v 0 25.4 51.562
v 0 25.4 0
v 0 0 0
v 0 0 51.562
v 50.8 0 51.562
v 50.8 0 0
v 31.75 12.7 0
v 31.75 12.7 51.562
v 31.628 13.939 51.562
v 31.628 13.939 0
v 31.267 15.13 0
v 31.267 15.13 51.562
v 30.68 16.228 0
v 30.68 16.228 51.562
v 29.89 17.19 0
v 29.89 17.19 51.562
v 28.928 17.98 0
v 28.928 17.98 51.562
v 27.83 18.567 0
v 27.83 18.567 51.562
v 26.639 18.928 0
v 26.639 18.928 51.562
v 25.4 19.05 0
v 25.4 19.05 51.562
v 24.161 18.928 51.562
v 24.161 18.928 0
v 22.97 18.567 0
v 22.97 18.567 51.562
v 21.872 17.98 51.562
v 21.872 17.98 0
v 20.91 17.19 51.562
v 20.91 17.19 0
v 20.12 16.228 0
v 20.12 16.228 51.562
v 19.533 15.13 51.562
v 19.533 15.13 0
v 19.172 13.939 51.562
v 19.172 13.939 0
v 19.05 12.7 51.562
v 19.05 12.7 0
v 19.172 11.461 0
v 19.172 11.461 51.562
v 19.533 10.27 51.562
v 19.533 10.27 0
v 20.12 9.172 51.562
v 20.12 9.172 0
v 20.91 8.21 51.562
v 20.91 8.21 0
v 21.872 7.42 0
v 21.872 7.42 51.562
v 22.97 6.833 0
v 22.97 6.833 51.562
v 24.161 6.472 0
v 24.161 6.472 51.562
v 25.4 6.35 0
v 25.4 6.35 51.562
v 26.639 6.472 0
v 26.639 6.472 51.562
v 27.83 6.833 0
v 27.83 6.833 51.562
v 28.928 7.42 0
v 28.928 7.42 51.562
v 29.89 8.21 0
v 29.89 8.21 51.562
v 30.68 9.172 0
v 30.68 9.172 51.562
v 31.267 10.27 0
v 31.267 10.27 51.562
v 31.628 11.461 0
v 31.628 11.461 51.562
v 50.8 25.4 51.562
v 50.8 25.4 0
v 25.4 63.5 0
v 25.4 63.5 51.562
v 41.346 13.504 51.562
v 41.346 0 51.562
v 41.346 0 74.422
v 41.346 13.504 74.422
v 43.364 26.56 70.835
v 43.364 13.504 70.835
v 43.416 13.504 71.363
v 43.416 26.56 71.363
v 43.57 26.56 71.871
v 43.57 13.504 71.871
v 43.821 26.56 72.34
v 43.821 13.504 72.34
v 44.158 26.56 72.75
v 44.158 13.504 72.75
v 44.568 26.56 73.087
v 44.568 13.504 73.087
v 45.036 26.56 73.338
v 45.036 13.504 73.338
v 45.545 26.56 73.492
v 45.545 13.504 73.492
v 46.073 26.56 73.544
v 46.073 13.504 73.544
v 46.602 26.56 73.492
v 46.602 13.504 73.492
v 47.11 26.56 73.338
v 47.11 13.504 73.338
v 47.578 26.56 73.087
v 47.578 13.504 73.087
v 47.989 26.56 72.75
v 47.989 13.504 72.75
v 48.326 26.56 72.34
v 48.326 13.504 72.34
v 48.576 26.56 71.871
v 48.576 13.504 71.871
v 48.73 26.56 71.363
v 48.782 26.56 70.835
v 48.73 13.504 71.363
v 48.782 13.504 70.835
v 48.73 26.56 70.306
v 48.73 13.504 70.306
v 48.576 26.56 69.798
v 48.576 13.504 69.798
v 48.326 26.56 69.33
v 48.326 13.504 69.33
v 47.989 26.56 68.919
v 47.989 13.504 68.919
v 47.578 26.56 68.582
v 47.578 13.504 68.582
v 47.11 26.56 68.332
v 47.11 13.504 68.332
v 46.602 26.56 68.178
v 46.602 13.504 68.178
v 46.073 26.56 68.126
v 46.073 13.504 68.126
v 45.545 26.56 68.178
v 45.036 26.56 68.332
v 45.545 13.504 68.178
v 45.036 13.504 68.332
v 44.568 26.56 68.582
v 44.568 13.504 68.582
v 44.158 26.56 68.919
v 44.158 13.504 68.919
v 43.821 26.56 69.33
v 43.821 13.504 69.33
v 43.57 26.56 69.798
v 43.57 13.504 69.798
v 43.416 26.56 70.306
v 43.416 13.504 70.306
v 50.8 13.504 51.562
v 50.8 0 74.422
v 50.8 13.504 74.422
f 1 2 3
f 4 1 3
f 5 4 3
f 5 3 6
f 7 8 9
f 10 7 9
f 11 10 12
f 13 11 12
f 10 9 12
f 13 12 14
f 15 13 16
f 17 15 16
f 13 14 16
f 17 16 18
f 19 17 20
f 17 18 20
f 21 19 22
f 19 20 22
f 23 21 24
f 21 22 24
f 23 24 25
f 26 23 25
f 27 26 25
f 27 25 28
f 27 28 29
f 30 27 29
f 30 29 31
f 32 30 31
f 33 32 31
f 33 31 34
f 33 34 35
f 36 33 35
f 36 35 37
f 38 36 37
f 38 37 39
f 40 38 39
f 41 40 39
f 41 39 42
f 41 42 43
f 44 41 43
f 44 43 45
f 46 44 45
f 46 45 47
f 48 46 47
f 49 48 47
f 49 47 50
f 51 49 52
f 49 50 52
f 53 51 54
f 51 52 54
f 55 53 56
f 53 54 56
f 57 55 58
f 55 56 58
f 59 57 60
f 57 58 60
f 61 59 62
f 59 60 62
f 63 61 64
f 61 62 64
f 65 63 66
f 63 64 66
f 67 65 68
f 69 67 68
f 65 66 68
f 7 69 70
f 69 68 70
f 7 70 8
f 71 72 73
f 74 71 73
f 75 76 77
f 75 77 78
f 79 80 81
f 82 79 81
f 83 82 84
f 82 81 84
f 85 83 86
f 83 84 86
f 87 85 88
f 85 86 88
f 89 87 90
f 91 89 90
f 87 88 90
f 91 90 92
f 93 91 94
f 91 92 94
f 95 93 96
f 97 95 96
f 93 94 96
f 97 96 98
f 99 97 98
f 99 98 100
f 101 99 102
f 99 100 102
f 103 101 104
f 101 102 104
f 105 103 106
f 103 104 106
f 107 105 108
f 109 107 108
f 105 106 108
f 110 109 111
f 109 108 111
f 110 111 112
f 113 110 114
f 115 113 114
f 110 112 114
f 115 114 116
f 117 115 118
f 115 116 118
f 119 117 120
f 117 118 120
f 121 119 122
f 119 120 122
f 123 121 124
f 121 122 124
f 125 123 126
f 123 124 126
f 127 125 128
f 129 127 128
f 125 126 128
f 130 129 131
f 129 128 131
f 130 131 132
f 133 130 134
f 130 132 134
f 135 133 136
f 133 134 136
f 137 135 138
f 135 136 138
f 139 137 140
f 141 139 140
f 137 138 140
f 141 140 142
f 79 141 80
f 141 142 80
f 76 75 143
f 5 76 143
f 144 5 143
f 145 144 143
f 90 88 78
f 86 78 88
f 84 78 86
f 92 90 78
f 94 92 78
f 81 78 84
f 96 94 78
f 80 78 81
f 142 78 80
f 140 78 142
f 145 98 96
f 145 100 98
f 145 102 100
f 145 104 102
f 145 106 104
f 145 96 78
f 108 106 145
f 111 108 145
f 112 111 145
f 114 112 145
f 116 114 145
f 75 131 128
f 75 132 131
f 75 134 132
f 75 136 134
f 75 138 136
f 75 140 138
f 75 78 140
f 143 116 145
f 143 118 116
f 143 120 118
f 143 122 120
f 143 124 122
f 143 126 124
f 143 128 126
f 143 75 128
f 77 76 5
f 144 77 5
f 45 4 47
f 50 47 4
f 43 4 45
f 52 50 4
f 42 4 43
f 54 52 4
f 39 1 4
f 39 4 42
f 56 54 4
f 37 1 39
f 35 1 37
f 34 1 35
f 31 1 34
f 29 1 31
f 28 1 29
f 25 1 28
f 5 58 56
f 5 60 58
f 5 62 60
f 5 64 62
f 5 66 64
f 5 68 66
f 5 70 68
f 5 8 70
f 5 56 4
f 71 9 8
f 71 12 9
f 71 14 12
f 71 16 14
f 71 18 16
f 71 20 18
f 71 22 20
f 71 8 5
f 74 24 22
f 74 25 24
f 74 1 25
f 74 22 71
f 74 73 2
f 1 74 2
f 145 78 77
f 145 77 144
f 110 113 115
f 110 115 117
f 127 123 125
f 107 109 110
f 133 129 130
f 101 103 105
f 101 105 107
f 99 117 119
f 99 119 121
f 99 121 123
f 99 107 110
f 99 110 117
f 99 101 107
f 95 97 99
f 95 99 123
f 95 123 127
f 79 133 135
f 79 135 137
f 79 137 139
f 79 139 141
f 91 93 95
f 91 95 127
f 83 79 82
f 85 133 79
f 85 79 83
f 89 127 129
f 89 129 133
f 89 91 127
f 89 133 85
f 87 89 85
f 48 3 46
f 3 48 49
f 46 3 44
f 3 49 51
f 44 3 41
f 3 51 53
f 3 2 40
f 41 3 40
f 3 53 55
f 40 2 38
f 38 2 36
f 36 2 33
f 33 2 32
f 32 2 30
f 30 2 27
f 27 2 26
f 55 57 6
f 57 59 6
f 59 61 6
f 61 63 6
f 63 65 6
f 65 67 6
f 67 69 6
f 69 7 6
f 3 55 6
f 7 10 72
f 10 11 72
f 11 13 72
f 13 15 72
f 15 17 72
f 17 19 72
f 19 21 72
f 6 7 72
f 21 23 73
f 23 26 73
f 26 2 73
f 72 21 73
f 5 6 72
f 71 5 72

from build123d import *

# Parameters (mm, degrees)
F1_DEPTH = 51.562
F2_R     = 6.35
F3_DEPTH = 51.563
F4_W     = 9.453815
F4_H     = 13.504244
F5_DEPTH = 22.86
F6_R     = 2.708969
F7_DEPTH = 13.0556


with BuildPart() as f1:
    # F0 (on Top) → F1 (new body)
    with BuildSketch(Plane.XY):
        Polygon((0, 25.4), (0, 0), (50.8, 0), (50.8, 25.4), (25.4, 25.4), align=None)
        Polygon((25.4, 63.5), (0, 25.4), (25.4, 25.4), align=None)
        Polygon((25.4, 25.4), (50.8, 25.4), (25.4, 63.5), align=None)
    extrude(amount=F1_DEPTH)

    # F2 (on face) → F3 (cut, through all)
    with BuildSketch(Plane.XY.offset(51.562)):
        with Locations((25.4, 12.7)):
            Circle(F2_R)
    extrude(amount=-F3_DEPTH, mode=Mode.SUBTRACT)


with BuildPart() as f5:
    # F4 (on face) → F5 (new body)
    with BuildSketch(Plane.XY.offset(51.562)):
        with Locations((46.073093, 6.752122)):
            Rectangle(F4_W, F4_H)
    extrude(amount=F5_DEPTH)

    # F6 (on face) → F7 (join)
    with BuildSketch(Plane(origin=(0, 13.504244, 0), x_dir=(-1, 0, 0), z_dir=(0, 1, 0))):
        with Locations((-46.073092, 70.834755)):
            Circle(F6_R)
    extrude(amount=F7_DEPTH)


solid = Compound([f1.part, f5.part])
